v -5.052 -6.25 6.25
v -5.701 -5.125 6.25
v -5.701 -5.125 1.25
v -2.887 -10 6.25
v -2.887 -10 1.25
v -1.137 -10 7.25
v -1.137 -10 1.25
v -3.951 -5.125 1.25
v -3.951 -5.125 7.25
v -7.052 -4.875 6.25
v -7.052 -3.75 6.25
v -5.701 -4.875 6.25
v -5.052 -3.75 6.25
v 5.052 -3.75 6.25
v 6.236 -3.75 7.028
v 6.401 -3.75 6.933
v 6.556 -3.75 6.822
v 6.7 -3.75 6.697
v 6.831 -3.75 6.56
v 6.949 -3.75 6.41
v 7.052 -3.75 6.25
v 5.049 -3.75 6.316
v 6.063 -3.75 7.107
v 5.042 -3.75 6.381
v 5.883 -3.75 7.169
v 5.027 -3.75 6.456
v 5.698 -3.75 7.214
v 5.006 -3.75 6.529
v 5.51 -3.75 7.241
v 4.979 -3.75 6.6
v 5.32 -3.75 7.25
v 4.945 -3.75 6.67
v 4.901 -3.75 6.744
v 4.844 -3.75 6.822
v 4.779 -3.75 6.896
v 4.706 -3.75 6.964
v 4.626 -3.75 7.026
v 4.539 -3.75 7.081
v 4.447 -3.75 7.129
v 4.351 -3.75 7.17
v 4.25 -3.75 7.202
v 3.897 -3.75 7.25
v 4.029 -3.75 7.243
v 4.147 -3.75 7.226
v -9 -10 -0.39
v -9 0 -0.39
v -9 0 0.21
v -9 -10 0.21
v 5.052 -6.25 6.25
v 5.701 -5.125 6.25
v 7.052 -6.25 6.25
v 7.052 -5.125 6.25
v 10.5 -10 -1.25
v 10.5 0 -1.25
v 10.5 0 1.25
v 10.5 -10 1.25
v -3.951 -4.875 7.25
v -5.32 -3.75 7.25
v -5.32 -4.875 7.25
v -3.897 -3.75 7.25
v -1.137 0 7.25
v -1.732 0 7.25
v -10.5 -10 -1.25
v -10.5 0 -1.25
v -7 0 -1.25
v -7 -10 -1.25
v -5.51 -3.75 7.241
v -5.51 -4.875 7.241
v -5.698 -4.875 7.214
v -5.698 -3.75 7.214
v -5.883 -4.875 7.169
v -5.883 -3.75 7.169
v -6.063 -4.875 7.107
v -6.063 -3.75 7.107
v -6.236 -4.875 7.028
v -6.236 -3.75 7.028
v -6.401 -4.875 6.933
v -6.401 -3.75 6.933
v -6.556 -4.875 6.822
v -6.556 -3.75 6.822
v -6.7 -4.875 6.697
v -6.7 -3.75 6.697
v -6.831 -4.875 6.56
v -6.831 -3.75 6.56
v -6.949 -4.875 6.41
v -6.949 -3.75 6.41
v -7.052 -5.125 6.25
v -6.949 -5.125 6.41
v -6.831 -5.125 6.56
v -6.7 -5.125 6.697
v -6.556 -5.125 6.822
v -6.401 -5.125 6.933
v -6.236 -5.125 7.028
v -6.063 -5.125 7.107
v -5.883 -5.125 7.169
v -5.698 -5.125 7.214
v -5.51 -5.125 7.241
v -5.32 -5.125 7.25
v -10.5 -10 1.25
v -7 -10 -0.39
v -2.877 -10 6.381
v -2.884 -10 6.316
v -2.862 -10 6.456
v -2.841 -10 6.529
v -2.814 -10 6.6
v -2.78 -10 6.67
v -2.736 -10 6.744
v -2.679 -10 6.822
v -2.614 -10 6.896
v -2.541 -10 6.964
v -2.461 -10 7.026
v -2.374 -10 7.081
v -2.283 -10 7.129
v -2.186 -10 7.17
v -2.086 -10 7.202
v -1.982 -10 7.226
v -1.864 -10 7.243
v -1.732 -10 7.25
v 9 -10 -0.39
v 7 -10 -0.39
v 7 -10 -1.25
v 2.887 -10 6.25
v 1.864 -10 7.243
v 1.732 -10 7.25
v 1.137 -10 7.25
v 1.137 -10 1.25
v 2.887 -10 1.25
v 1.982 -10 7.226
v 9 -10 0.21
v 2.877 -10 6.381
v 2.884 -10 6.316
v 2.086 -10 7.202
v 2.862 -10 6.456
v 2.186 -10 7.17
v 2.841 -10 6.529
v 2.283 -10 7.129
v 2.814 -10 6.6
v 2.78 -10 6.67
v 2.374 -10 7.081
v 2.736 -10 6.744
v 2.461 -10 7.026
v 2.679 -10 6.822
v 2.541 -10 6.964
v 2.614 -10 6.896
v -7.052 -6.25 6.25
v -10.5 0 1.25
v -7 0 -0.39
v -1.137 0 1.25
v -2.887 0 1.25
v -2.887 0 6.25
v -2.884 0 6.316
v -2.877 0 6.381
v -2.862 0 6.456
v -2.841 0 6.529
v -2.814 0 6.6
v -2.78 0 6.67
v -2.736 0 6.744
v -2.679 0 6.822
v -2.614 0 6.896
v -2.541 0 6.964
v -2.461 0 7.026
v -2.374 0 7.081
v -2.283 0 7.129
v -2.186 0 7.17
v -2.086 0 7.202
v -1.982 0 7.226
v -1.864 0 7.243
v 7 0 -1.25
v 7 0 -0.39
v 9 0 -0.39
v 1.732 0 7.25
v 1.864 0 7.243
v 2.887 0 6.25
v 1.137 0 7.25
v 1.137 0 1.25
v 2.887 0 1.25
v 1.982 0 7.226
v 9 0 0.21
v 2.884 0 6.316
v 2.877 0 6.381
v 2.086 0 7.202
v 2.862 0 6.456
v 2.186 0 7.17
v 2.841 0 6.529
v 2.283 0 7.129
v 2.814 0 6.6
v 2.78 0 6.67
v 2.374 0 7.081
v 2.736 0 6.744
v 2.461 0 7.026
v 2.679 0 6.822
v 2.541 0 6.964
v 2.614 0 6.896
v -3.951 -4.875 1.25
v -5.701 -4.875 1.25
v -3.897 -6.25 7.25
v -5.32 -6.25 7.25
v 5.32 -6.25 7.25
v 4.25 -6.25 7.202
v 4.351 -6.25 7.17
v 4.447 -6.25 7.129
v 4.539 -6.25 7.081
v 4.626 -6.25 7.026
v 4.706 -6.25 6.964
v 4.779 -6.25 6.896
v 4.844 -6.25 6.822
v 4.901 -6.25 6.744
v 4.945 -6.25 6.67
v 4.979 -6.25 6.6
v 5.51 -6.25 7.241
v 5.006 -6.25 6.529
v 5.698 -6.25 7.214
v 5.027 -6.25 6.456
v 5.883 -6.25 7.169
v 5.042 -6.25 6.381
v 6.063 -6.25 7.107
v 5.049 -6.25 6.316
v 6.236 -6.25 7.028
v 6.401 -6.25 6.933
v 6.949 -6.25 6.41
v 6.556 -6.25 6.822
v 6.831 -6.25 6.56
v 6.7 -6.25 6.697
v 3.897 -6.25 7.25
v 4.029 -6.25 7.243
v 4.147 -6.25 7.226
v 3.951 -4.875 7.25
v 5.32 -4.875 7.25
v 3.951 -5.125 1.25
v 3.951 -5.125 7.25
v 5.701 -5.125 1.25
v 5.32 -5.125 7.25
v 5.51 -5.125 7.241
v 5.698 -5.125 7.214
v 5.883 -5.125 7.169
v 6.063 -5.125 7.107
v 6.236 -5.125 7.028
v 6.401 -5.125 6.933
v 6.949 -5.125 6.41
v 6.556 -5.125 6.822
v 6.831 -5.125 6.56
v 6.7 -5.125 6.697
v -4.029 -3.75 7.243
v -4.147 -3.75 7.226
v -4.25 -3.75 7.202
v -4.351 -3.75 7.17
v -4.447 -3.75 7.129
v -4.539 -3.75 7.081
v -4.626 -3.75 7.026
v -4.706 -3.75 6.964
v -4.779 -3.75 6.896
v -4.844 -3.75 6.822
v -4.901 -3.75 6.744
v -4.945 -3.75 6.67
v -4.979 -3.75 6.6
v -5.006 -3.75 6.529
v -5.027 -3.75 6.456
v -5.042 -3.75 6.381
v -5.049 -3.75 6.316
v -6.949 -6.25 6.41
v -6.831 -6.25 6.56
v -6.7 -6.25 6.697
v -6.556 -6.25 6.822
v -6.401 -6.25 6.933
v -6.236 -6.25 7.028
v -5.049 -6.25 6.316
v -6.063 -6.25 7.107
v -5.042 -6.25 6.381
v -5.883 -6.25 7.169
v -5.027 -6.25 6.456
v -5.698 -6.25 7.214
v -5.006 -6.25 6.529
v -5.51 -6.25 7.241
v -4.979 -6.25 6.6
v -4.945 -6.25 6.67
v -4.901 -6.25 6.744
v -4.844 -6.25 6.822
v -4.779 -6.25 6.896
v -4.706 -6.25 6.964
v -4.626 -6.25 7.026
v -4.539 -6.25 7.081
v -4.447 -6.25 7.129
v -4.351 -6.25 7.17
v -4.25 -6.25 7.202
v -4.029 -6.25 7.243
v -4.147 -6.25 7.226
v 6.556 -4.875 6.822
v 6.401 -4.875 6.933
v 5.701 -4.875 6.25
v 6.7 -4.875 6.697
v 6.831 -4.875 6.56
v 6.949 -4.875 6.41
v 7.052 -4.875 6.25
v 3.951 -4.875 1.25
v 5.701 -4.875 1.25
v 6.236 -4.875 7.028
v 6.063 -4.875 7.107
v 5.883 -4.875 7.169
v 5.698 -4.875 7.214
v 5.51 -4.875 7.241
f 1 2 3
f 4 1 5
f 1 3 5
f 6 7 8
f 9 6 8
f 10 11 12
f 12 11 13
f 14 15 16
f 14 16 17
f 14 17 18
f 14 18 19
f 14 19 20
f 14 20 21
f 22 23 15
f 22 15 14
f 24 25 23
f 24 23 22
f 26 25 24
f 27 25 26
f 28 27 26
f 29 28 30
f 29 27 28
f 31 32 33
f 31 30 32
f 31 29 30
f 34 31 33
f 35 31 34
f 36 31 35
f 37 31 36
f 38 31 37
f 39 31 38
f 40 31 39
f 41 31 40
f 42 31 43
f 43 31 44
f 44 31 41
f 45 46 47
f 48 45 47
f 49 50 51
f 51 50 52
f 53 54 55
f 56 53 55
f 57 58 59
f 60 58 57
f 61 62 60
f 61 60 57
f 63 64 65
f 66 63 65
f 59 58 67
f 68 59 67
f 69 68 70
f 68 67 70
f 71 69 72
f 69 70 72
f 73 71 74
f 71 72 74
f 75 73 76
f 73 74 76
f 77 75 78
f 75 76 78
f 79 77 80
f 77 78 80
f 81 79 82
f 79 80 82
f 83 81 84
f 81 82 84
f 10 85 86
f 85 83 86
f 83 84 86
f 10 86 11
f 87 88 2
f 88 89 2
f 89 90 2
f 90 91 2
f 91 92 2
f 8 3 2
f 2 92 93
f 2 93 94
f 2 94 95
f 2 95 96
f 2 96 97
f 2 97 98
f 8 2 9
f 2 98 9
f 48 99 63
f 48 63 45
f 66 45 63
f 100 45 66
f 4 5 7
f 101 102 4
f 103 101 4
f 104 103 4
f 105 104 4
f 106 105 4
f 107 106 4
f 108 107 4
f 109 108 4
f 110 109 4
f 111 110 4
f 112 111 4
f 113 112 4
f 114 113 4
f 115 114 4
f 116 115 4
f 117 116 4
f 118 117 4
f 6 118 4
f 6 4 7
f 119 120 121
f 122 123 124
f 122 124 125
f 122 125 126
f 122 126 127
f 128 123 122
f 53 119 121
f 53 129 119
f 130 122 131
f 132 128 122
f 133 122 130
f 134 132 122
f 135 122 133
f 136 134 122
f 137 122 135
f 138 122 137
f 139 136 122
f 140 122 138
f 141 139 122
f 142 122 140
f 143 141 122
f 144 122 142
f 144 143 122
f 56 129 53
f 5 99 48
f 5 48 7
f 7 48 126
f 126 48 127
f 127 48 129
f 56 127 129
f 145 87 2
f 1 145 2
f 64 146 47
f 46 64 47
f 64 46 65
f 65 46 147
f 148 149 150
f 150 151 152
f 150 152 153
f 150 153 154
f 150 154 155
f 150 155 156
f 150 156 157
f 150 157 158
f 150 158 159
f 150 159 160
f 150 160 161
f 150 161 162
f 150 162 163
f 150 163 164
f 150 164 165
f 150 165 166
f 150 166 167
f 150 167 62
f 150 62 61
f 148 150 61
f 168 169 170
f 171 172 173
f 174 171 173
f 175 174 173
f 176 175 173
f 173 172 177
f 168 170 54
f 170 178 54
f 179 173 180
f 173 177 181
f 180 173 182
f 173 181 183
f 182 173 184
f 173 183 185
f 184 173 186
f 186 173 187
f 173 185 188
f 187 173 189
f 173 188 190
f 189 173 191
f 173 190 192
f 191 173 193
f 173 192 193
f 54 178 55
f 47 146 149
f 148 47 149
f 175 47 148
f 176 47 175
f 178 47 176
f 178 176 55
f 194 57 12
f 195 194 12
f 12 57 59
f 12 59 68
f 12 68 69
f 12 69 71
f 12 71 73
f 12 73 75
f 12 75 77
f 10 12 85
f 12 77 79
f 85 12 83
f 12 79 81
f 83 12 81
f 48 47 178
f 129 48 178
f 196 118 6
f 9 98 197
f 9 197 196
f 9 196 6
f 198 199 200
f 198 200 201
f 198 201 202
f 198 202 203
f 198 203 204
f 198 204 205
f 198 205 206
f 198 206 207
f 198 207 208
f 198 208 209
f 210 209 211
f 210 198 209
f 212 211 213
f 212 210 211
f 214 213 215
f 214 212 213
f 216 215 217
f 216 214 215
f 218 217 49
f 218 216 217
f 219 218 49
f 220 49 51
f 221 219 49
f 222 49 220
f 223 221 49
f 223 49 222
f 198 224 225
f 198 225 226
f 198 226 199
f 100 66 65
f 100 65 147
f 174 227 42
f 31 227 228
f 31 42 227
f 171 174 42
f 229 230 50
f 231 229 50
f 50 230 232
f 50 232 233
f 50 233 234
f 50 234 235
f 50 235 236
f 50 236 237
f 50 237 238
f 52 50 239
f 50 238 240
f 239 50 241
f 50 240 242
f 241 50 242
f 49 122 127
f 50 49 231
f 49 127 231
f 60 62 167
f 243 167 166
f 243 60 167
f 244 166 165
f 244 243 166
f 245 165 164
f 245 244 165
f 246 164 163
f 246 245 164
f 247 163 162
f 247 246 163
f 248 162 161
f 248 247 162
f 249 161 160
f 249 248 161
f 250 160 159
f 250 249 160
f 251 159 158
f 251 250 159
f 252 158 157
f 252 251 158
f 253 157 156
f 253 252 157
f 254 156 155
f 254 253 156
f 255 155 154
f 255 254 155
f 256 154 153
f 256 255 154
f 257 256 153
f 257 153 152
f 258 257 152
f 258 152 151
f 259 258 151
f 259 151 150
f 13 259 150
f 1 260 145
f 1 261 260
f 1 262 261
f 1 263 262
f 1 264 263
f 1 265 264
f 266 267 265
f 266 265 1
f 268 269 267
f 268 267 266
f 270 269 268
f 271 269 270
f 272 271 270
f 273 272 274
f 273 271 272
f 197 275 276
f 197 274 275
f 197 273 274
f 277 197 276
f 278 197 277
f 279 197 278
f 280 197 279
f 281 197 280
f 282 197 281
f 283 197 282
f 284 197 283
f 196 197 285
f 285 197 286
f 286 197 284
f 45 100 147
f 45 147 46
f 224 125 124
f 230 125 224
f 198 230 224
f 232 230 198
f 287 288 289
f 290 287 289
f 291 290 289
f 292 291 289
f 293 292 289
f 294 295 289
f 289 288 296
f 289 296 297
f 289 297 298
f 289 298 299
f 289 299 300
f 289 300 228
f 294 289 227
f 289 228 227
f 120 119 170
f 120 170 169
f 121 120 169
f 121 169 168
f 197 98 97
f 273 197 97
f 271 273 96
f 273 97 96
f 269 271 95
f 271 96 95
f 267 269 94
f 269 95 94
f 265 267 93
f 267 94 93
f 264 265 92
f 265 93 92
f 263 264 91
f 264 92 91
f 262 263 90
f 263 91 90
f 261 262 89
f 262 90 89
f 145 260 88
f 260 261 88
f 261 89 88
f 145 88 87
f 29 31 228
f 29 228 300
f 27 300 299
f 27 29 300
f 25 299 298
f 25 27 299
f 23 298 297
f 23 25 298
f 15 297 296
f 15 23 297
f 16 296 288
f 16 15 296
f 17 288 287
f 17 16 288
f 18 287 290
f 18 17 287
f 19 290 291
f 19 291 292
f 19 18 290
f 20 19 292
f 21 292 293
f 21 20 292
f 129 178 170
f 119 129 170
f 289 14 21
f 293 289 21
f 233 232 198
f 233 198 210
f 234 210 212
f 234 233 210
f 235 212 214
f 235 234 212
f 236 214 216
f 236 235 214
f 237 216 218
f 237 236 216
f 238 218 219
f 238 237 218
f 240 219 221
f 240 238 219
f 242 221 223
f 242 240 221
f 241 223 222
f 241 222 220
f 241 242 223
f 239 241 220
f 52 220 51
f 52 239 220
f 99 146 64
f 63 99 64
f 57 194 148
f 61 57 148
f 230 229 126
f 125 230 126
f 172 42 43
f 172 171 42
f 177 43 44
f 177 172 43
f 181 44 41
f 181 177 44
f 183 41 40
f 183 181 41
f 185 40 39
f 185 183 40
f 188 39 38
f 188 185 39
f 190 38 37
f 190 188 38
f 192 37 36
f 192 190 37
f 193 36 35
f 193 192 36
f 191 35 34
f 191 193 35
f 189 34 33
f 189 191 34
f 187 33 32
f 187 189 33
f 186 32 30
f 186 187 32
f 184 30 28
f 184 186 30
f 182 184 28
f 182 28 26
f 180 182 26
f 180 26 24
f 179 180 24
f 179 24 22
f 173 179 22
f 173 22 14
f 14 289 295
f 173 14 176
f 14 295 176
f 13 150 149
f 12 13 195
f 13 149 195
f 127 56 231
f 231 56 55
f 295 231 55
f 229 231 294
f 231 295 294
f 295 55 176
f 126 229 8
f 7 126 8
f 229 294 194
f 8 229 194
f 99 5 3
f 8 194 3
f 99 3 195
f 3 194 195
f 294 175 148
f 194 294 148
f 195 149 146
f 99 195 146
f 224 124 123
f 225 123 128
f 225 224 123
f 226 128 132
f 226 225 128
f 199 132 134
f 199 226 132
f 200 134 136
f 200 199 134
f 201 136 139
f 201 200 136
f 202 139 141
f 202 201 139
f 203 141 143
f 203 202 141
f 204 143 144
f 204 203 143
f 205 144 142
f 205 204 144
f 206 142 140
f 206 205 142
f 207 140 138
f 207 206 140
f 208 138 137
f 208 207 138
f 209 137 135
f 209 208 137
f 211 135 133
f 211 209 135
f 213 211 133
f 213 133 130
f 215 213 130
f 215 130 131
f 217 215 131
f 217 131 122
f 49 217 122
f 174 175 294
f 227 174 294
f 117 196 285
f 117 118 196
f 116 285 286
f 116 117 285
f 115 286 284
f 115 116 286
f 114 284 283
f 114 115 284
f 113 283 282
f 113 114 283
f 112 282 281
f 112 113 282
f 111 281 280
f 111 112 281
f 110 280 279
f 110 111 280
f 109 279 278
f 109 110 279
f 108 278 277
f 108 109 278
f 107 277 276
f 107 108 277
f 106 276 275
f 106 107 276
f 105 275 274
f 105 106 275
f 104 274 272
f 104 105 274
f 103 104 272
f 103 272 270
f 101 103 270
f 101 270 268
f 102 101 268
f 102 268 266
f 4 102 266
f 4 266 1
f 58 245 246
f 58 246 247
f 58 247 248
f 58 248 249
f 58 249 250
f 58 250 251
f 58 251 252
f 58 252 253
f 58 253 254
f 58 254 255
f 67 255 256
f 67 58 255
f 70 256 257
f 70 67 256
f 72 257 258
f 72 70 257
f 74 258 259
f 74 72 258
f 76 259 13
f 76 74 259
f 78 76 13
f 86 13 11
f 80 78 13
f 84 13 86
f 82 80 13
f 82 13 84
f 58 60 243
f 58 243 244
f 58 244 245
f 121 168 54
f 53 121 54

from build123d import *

# Parameters (mm, degrees)
F1_DEPTH    = 10
F3_DEPTH    = 6
F6_DEPTH    = 1
F7_DEPTH    = 1
F8_T1_DEPTH = 11.1602540378
F9_R        = 1
F10_W       = 3.6315133076
F10_H       = 0.25
F11_DEPTH   = 6
F12_W       = 3.6315133076
F12_H       = 0.25
F13_DEPTH   = 6


# Not quite as in the source:
# - a fillet or chamfer that OpenCascade refuses, or shapes differently, is made with other operations: its cross-section is extruded or revolved along the edge and cut away or added


with BuildPart() as f1:
    # F0 (on Front) → F1 (new body)
    with BuildSketch(Plane.XZ):
        Polygon((7, -1.25), (10.5, -1.25), (10.5, 1.25), (-10.5, 1.25), (-10.5, -1.25), (-7, -1.25), (-7, -0.3903658071), (-9, -0.3903658071), (-9, 0.2096341929), (9, 0.2096341929), (9, -0.3903658071), (7, -0.3903658071), align=None)
    extrude(amount=F1_DEPTH)

    # F2 (on face) → F3 (join)
    with BuildSketch(Plane.XY.offset(1.25)):
        Polygon((-1.137, -10), (-4.0235, -5), (-5.7735, -5), (-2.887, -10), align=None)
        Polygon((-4.0235, -5), (-1.137, 0), (-2.887, 0), (-5.7735, -5), align=None)
        Polygon((2.887, 0), (1.137, 0), (4.0235, -5), (5.7735, -5), align=None)
        Polygon((5.7735, -5), (4.0235, -5), (1.137, -10), (2.887, -10), align=None)
    extrude(amount=F3_DEPTH)

    # F4 (on face) → F6 (join)
    with BuildSketch(Plane.XY.offset(7.25)):
        Polygon((-5.7735, -5), (-5.051875, -3.75), (-7.051875, -3.75), (-7.051875, -6.25), (-5.051875, -6.25), align=None)
    extrude(amount=-F6_DEPTH)

    # F5 (on face) → F7 (join)
    with BuildSketch(Plane.XY.offset(7.25)):
        Polygon((7.051875, -3.75), (5.051875, -3.75), (5.7735, -5), (5.051875, -6.25), (7.051875, -6.25), align=None)
    extrude(amount=-F7_DEPTH)

    # F8: fillet of radius 2 on 2 edges, made by hand

    # F8_s2 → F8_t1 (cut)
    with BuildSketch(Plane.XZ.offset(-0.5801270189)):
        with BuildLine():
            ThreePointArc((-5.3198241924, 7.25), (-6.3198241924, 6.9820508076), (-7.051875, 6.25))
            Line((-7.051875, 6.25), (-7.051875, 7.25))
            Line((-7.051875, 7.25), (-5.3198241924, 7.25))
        make_face()
        with BuildLine():
            ThreePointArc((5.3198241924, 7.25), (6.3198241924, 6.9820508076), (7.051875, 6.25))
            Line((7.051875, 6.25), (7.051875, 7.25))
            Line((7.051875, 7.25), (5.3198241924, 7.25))
        make_face()
    extrude(amount=F8_T1_DEPTH, mode=Mode.SUBTRACT)

    # F9
    f9_edges = [f1.edges().sort_by_distance(p)[0] for p in [
        (-3.969438, -8.125, 7.25),
        (-3.969438, -1.875, 7.25),
        (3.969437, -8.125, 7.25),
        (3.969437, -1.875, 7.25),
    ]]
    fillet(f9_edges, radius=F9_R)

    # F10 (on face) → F11 (cut)
    with BuildSketch(Plane.XY.offset(7.25)):
        Polygon((-4.0235, -5), (-3.9513375, -4.875), (-5.3198241924, -4.875), (-5.3198241924, -5.125), (-3.9513375, -5.125), align=None)
        with Locations((-7.1355808462, -5)):
            Rectangle(F10_W, F10_H)
    extrude(amount=-F11_DEPTH, mode=Mode.SUBTRACT)

    # F12 (on face) → F13 (cut)
    with BuildSketch(Plane.XY.offset(7.25)):
        with Locations((7.1355808462, -5)):
            Rectangle(F12_W, F12_H)
        Polygon((5.3198241924, -4.875), (3.9513375, -4.875), (4.0235, -5), (3.9513375, -5.125), (5.3198241924, -5.125), align=None)
    extrude(amount=-F13_DEPTH, mode=Mode.SUBTRACT)


solid = f1.part
